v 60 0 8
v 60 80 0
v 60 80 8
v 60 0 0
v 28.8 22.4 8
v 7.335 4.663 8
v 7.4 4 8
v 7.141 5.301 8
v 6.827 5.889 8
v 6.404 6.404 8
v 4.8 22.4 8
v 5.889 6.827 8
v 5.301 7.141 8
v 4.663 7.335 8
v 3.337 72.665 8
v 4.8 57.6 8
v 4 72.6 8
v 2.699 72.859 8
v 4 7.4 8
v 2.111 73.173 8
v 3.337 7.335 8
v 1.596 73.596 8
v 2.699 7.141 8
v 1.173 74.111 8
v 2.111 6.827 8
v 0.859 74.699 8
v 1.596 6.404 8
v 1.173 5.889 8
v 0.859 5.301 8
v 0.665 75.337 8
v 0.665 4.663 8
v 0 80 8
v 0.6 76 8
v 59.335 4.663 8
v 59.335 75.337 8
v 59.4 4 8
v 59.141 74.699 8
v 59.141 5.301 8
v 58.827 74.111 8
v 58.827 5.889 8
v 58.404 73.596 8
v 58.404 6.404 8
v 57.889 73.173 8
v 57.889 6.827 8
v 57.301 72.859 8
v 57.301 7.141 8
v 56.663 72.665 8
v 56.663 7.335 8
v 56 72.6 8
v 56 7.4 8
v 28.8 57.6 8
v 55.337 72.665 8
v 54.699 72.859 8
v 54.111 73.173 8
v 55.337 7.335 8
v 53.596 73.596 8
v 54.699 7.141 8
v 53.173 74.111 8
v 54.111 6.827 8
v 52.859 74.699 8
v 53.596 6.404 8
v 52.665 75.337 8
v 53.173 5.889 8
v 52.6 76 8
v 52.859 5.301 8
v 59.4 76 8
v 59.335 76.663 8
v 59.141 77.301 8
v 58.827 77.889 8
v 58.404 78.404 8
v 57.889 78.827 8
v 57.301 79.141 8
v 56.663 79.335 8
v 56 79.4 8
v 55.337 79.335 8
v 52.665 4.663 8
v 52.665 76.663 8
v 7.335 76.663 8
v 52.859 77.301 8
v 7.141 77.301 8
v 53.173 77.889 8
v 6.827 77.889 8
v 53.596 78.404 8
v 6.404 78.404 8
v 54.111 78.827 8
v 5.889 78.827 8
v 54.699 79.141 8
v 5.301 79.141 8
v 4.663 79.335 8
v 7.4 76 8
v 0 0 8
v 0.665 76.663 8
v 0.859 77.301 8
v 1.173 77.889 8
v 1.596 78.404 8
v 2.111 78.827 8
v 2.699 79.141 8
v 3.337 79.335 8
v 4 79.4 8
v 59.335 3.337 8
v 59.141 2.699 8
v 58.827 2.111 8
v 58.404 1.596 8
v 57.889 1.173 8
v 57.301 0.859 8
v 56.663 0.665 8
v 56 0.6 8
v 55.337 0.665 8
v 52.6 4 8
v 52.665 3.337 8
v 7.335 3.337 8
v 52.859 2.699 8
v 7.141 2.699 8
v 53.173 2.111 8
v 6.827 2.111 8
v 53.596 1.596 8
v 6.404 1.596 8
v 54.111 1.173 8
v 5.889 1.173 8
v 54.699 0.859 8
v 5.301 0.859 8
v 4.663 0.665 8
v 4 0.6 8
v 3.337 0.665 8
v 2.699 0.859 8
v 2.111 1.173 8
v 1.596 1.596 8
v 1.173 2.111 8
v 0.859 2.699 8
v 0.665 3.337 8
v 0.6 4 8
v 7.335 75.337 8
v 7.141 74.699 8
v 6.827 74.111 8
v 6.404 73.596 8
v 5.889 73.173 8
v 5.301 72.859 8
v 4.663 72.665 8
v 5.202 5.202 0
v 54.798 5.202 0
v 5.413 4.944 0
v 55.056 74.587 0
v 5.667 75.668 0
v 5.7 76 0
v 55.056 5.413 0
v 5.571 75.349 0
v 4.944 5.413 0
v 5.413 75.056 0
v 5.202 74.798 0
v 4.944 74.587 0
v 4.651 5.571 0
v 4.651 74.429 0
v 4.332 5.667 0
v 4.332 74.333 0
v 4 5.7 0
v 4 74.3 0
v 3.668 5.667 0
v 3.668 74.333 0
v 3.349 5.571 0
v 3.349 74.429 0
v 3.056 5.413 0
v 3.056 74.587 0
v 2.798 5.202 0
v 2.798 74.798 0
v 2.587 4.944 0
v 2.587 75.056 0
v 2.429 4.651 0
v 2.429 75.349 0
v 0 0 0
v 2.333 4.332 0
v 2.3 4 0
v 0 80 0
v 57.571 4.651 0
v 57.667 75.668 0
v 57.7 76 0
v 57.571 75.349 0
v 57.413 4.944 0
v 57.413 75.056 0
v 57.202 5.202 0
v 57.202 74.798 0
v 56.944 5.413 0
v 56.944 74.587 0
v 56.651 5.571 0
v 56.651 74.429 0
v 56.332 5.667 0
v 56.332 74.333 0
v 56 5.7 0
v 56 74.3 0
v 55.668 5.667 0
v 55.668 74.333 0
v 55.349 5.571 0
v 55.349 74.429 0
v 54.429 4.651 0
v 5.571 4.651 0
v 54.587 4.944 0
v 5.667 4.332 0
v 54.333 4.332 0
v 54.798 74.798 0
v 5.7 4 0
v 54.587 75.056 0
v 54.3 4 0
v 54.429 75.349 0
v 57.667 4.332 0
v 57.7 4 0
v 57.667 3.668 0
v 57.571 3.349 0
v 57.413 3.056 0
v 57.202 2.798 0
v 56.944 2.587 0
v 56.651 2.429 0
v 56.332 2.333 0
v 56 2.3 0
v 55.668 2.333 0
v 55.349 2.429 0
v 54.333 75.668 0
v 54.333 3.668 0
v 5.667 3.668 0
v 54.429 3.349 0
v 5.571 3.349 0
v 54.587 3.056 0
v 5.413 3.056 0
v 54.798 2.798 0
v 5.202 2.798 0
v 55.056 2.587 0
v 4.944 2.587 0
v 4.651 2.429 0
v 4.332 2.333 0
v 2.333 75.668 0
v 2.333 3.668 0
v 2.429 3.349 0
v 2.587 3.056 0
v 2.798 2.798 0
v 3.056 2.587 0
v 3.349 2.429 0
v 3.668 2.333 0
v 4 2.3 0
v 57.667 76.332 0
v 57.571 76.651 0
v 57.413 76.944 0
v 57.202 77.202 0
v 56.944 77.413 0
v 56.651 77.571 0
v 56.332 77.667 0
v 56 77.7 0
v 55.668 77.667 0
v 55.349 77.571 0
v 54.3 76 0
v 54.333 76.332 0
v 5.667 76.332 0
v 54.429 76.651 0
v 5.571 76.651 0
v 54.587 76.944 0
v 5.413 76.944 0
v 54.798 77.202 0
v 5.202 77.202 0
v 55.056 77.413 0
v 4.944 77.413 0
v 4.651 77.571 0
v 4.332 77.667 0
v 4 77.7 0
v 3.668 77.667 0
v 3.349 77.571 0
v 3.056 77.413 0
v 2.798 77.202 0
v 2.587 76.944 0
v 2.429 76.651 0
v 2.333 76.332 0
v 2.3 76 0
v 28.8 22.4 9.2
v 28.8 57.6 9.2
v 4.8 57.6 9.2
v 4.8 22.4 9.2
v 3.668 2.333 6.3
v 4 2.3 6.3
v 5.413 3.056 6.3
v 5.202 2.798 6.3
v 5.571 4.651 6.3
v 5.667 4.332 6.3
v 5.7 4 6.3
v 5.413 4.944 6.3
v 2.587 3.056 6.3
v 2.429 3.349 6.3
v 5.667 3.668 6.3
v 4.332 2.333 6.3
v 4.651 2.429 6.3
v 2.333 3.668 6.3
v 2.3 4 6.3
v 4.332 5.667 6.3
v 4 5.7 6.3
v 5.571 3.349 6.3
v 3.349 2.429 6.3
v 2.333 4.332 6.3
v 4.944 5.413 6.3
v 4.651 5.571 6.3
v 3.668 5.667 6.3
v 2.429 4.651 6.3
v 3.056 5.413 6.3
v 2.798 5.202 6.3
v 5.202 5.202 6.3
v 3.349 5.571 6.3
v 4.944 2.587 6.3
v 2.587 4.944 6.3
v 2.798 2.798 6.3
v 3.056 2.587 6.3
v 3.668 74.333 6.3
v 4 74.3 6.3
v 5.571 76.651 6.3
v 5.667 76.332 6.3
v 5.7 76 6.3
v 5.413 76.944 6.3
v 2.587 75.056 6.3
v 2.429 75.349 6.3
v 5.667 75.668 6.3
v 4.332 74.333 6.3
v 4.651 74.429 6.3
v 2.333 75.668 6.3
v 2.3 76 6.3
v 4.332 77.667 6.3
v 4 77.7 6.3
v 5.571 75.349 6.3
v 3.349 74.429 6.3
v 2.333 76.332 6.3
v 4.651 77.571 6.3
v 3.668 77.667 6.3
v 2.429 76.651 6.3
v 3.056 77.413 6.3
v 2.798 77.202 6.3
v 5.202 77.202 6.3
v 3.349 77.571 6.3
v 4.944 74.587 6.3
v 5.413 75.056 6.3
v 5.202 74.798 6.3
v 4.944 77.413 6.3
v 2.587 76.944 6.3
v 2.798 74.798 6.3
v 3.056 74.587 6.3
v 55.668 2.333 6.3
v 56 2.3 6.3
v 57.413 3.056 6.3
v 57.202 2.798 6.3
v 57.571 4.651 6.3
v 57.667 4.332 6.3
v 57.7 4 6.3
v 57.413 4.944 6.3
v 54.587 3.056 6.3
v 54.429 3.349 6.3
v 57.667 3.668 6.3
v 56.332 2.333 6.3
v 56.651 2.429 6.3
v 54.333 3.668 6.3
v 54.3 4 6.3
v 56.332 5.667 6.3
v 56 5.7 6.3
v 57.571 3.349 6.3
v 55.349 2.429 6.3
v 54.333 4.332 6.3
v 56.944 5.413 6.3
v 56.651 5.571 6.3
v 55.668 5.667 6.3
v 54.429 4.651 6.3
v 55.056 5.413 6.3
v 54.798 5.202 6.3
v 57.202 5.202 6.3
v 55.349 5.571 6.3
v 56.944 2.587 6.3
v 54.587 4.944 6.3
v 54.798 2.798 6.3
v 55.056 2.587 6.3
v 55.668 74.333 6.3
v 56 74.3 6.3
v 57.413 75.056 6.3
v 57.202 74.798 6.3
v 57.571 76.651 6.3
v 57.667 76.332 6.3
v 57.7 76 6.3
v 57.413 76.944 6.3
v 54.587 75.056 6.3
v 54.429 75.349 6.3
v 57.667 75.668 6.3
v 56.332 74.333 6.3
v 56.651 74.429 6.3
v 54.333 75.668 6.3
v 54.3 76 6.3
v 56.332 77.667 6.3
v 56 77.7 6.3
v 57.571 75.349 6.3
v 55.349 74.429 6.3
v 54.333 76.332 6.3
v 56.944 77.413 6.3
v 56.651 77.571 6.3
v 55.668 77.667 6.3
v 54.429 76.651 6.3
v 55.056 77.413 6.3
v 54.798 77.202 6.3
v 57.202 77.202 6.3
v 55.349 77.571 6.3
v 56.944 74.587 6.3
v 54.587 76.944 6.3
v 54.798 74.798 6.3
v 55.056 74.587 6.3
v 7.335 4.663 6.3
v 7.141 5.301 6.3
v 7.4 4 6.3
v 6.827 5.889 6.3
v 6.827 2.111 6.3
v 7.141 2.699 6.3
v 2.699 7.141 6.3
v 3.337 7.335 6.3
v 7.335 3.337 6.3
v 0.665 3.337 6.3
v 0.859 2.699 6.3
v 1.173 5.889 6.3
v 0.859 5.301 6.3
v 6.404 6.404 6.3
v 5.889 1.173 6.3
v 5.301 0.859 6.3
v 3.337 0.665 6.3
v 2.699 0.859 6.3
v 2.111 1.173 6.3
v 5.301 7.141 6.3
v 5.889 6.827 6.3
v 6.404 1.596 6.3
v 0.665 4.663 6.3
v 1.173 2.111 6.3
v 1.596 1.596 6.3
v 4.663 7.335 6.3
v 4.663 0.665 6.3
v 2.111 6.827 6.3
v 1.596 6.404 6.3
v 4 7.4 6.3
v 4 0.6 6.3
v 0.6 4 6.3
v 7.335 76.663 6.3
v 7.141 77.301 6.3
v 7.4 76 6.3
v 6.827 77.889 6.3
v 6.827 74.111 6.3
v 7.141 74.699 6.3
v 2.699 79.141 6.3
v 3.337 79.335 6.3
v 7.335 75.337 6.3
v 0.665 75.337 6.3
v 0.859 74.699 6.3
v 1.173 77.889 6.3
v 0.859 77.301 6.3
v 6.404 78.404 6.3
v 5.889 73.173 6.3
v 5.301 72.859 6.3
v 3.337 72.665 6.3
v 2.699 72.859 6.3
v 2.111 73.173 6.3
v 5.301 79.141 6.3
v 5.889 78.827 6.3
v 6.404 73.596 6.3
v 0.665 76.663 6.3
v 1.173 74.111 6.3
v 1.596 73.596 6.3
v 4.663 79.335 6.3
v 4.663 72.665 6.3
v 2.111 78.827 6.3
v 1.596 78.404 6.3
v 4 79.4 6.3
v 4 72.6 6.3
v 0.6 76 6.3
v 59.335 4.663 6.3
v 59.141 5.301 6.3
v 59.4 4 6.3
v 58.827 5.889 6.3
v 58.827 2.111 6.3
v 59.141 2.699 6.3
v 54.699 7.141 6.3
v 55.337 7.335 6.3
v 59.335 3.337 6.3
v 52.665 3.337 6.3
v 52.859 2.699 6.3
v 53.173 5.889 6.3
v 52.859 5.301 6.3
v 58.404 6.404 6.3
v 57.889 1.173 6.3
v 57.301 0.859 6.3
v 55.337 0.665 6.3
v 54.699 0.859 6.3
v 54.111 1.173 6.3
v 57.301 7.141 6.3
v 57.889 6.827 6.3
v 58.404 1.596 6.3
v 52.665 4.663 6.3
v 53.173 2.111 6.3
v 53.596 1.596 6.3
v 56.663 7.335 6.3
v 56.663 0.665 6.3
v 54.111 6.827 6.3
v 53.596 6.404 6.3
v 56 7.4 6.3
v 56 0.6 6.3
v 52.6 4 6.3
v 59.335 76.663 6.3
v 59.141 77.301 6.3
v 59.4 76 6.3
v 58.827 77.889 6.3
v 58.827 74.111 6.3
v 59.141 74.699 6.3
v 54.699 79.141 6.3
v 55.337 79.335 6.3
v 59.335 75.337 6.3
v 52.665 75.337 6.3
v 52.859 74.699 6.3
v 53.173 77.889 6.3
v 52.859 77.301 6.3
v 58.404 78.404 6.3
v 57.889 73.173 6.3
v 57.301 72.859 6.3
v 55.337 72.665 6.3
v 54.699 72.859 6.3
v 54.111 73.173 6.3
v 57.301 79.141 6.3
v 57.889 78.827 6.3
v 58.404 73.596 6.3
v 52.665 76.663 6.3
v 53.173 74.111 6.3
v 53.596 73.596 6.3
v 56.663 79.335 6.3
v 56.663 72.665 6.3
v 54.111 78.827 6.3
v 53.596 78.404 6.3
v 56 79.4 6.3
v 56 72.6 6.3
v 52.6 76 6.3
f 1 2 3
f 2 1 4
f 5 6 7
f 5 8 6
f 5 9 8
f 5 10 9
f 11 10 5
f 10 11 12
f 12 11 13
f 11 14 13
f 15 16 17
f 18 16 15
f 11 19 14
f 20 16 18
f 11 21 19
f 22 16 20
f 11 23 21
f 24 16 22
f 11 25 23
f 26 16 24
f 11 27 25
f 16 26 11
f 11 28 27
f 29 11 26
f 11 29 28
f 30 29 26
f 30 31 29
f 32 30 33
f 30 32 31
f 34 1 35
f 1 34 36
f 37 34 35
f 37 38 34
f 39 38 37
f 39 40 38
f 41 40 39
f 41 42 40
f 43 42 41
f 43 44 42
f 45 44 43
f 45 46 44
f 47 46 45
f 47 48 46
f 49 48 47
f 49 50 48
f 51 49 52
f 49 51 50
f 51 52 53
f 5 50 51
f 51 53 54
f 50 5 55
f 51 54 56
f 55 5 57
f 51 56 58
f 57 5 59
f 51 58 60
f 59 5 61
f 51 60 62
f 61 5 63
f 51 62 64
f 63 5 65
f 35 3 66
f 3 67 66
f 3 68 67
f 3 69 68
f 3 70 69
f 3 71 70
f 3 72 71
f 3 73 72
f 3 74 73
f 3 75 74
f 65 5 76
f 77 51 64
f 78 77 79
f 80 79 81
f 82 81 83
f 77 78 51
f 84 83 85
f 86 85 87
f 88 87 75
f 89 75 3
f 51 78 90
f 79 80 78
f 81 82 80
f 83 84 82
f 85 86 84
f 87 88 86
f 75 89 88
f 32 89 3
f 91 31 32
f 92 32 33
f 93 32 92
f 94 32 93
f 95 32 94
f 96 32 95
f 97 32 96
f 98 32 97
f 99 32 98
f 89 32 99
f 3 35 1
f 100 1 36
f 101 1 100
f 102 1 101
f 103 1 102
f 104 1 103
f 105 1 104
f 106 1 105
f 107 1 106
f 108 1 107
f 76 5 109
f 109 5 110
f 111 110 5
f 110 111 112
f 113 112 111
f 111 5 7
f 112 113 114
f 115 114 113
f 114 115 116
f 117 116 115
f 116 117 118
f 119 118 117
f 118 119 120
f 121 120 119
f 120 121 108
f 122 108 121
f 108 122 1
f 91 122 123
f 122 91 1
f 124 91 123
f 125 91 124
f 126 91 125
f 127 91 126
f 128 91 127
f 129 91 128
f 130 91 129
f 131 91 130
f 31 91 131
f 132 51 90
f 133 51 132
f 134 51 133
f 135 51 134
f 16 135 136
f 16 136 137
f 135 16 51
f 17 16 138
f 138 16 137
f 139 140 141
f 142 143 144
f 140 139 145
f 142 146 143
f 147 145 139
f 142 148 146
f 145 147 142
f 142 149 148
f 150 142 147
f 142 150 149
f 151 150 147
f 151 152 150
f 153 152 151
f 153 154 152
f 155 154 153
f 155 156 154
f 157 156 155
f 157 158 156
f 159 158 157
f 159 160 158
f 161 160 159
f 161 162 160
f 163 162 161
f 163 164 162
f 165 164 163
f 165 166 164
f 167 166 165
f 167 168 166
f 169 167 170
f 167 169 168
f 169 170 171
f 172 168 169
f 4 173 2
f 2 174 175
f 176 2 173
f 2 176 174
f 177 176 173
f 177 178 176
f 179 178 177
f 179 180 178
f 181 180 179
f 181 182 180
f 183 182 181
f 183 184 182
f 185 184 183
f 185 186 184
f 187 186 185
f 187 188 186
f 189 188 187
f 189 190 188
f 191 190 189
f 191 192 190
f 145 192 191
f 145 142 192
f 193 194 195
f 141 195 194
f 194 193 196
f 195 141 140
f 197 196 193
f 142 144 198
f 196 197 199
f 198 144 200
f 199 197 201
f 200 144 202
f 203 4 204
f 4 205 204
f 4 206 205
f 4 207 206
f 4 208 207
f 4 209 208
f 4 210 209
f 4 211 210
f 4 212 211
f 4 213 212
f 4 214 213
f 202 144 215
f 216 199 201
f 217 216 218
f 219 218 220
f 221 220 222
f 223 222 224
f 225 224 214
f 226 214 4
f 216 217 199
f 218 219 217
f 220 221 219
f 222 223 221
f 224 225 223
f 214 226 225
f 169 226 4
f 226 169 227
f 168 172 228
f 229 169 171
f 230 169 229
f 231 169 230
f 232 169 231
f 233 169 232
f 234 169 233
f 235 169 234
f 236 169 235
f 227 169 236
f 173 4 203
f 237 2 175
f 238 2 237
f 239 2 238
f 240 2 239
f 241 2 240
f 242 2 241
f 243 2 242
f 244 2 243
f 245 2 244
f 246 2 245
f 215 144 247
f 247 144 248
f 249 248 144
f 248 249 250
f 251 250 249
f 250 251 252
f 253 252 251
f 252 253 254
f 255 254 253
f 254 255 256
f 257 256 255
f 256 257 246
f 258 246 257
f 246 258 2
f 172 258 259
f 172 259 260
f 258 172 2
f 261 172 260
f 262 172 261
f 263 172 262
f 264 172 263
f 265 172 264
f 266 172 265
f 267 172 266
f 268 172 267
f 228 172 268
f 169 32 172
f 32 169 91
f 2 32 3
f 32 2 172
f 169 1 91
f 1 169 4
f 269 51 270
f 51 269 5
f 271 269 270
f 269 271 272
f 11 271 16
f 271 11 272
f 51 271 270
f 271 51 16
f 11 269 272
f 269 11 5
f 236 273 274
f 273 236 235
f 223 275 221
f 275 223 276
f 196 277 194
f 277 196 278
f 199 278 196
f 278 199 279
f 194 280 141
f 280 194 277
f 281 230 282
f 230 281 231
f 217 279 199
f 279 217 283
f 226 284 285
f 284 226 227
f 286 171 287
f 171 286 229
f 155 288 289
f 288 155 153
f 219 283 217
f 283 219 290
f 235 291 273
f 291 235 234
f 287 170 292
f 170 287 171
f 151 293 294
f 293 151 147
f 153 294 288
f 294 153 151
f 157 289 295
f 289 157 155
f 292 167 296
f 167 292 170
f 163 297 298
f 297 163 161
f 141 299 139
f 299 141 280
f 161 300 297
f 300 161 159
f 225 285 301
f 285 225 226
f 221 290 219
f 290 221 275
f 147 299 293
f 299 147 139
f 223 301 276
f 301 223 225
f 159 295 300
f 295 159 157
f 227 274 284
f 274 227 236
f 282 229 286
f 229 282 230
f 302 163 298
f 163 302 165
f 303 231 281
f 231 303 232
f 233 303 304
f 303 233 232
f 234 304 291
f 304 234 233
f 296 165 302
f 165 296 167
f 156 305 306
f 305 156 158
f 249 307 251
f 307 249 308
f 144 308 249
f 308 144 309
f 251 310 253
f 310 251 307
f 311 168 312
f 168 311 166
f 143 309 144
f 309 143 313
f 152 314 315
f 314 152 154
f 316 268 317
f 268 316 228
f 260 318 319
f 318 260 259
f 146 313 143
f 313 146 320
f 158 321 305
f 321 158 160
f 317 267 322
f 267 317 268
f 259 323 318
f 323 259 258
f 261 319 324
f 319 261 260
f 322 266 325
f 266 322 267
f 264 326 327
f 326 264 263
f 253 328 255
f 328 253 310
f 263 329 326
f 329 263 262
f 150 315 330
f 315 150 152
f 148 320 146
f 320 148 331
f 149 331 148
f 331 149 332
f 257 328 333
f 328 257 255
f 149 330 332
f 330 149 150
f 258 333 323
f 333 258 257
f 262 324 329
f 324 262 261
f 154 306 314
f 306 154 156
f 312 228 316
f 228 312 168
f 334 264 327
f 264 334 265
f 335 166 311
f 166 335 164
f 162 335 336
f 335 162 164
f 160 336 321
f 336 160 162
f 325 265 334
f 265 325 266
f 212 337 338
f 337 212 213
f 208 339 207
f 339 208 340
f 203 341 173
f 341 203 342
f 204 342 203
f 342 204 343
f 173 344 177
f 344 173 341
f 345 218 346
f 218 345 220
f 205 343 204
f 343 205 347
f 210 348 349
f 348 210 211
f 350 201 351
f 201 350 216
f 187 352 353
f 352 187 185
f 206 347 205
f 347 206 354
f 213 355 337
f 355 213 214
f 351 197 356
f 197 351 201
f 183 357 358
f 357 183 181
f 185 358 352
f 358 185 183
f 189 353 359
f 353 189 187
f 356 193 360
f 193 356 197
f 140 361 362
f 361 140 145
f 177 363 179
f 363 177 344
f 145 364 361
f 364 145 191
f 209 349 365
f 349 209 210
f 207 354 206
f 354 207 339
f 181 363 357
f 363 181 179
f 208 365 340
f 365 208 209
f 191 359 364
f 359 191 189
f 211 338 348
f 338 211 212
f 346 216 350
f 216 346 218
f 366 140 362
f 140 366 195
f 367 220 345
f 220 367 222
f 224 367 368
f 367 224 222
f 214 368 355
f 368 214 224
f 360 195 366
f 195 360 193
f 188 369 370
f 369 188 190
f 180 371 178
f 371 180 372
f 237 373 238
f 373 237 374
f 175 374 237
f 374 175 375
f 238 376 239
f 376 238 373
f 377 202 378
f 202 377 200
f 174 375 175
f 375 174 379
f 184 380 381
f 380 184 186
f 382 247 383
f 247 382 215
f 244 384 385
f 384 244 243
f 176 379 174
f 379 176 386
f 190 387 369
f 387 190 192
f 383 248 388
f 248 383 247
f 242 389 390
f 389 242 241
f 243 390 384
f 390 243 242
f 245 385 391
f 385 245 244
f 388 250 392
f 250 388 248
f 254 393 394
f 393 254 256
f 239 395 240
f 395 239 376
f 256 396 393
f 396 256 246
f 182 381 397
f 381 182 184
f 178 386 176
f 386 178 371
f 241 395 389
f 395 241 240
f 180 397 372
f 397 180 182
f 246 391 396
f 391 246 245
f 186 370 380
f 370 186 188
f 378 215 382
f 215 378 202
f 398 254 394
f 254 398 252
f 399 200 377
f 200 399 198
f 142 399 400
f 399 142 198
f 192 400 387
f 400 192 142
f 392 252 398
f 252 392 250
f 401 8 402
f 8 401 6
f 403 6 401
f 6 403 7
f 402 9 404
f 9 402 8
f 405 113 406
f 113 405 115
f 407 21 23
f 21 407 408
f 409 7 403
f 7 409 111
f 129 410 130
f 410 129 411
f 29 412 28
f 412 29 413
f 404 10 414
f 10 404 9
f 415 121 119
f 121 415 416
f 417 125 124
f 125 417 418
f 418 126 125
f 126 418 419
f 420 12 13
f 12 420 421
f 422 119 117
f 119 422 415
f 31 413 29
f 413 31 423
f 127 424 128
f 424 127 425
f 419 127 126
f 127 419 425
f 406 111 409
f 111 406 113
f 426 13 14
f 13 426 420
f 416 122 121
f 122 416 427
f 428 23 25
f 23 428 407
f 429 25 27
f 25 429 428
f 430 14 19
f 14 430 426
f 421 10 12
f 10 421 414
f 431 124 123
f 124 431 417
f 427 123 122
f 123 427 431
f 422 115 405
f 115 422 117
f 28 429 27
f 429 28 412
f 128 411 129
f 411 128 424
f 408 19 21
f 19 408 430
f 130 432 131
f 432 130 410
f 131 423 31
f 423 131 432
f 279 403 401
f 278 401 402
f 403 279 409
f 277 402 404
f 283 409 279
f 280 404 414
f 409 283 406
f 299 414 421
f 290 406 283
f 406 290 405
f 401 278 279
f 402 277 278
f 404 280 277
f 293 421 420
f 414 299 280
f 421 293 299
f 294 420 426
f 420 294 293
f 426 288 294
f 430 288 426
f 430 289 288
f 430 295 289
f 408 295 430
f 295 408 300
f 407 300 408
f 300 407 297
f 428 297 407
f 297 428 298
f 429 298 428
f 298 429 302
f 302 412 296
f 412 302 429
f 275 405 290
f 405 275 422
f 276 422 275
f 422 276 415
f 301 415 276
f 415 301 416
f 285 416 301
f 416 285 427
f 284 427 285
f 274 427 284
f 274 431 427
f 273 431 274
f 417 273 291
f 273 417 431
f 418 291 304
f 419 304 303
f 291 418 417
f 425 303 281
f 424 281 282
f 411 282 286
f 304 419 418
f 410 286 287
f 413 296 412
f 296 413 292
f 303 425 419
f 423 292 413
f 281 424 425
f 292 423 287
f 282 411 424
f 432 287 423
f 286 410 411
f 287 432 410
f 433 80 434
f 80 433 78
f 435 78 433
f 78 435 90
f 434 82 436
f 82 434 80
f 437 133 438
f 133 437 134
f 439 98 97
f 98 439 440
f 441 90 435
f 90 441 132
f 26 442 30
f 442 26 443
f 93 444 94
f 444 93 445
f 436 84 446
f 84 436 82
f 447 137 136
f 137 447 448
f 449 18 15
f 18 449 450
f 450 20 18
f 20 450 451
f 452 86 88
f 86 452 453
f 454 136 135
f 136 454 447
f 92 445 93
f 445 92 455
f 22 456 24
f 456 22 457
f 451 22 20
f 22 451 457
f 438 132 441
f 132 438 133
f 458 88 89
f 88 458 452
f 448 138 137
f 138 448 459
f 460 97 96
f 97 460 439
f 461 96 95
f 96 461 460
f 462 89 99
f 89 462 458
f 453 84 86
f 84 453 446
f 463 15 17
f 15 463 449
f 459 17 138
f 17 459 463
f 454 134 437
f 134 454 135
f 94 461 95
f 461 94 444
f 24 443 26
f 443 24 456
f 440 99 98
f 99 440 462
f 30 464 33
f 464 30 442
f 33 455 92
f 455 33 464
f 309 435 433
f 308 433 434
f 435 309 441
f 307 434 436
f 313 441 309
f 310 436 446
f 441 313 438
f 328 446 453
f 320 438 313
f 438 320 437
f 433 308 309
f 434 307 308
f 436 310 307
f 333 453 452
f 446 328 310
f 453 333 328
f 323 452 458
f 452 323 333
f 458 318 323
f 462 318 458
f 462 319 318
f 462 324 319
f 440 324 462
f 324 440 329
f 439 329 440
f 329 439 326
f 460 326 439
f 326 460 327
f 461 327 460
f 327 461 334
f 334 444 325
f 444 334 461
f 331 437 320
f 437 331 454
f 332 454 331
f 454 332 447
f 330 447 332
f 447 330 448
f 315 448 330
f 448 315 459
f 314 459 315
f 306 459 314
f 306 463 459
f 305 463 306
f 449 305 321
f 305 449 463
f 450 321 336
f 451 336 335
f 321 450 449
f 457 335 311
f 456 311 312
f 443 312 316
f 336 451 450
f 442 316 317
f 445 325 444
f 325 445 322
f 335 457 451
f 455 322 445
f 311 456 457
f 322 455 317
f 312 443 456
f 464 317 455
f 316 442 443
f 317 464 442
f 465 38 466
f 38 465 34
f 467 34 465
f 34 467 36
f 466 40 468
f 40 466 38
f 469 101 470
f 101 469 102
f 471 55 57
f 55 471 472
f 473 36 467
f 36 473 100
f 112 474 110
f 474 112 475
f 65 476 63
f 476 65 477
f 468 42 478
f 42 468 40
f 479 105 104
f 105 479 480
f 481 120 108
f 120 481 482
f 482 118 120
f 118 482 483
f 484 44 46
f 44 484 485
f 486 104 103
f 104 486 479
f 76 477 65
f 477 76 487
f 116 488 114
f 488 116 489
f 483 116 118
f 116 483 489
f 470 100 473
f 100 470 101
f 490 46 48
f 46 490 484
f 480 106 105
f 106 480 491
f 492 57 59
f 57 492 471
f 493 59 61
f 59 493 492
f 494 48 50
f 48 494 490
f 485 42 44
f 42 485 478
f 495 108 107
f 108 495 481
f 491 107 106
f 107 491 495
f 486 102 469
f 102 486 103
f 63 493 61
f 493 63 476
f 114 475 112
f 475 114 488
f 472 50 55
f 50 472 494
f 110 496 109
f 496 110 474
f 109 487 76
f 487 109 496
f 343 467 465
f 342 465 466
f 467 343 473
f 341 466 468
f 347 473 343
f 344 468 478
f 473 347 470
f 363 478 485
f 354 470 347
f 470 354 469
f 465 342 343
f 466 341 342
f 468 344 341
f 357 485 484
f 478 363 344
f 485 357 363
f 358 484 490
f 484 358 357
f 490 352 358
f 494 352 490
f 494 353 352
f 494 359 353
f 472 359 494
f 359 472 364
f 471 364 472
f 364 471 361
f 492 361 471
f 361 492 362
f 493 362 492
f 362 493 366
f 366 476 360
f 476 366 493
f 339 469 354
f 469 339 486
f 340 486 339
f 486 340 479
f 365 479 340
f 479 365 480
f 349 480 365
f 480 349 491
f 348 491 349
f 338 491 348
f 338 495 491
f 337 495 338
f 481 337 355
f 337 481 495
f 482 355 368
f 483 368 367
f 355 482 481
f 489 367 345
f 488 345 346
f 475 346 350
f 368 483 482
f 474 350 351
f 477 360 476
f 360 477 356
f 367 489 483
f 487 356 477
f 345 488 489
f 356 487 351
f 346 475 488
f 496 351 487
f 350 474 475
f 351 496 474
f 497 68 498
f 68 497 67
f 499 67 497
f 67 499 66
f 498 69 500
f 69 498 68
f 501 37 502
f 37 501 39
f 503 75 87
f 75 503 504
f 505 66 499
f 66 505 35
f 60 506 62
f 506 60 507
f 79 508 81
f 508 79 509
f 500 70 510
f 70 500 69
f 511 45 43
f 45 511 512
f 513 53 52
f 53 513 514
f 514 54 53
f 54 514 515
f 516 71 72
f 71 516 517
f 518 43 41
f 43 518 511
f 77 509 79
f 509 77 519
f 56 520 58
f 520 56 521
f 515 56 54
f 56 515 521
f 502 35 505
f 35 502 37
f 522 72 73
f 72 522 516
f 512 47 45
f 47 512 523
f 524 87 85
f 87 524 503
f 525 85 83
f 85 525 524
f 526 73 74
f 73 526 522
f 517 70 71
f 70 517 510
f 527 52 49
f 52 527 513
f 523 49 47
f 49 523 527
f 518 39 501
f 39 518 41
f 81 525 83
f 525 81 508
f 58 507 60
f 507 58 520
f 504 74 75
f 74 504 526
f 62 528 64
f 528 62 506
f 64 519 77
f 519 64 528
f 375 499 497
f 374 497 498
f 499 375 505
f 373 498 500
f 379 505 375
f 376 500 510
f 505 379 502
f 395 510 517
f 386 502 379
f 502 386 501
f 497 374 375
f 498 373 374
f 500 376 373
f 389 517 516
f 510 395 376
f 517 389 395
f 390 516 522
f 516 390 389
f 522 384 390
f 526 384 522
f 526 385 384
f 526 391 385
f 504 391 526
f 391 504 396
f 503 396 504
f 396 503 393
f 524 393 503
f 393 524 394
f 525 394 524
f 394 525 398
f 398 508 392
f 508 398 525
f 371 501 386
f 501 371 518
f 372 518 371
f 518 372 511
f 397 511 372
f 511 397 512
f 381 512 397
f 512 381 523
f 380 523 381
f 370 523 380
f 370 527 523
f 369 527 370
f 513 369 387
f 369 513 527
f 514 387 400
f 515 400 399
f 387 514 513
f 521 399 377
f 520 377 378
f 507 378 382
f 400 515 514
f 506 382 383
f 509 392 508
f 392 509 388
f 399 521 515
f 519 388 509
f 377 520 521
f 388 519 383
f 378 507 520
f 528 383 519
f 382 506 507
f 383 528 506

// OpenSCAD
$fn = 32;

// ----------------------------------------------------------------------
// Enclosure lid: 60 x 80 x 8 mm, 4 bolt holes
// ----------------------------------------------------------------------

// --- parameters (mm) ---
length = 60;              // lid length, X
width = 80;               // lid width, Y
plate_t = 8;              // lid plate thickness
bolt_d = 3.4;             // bolt clearance
boss_lip = 4;             // bolt hole inset from the corner
sink = 1;                 // overlap of the lip and ribs into the plate
cs_d = 6.8;               // countersink diameter
cs_h = 1.7;               // countersink depth
label_h = 1.2;            // raised marking pad

module plate() {
  cube([length, width, plate_t]);
  /* raised marking pad on top, sunk 1 mm into the plate */
  translate([length * 0.08, width * 0.28, plate_t - 1]) cube([length * 0.4, width * 0.44, label_h + 1]);
}

difference() {
  plate();
  /* bolt pattern matching the corner bosses */
  for (sx = [0, 1]) for (sy = [0, 1])
    translate([sx * (length - 2 * boss_lip) + boss_lip, sy * (width - 2 * boss_lip) + boss_lip, -0 - 1])
      cylinder(h = plate_t + 0 + 2, d = bolt_d);
  /* countersinks so the heads sit flush */
  for (sx = [0, 1]) for (sy = [0, 1])
    translate([sx * (length - 2 * boss_lip) + boss_lip, sy * (width - 2 * boss_lip) + boss_lip, plate_t - cs_h])
      cylinder(h = cs_h + 0.5, d = cs_d);
}
